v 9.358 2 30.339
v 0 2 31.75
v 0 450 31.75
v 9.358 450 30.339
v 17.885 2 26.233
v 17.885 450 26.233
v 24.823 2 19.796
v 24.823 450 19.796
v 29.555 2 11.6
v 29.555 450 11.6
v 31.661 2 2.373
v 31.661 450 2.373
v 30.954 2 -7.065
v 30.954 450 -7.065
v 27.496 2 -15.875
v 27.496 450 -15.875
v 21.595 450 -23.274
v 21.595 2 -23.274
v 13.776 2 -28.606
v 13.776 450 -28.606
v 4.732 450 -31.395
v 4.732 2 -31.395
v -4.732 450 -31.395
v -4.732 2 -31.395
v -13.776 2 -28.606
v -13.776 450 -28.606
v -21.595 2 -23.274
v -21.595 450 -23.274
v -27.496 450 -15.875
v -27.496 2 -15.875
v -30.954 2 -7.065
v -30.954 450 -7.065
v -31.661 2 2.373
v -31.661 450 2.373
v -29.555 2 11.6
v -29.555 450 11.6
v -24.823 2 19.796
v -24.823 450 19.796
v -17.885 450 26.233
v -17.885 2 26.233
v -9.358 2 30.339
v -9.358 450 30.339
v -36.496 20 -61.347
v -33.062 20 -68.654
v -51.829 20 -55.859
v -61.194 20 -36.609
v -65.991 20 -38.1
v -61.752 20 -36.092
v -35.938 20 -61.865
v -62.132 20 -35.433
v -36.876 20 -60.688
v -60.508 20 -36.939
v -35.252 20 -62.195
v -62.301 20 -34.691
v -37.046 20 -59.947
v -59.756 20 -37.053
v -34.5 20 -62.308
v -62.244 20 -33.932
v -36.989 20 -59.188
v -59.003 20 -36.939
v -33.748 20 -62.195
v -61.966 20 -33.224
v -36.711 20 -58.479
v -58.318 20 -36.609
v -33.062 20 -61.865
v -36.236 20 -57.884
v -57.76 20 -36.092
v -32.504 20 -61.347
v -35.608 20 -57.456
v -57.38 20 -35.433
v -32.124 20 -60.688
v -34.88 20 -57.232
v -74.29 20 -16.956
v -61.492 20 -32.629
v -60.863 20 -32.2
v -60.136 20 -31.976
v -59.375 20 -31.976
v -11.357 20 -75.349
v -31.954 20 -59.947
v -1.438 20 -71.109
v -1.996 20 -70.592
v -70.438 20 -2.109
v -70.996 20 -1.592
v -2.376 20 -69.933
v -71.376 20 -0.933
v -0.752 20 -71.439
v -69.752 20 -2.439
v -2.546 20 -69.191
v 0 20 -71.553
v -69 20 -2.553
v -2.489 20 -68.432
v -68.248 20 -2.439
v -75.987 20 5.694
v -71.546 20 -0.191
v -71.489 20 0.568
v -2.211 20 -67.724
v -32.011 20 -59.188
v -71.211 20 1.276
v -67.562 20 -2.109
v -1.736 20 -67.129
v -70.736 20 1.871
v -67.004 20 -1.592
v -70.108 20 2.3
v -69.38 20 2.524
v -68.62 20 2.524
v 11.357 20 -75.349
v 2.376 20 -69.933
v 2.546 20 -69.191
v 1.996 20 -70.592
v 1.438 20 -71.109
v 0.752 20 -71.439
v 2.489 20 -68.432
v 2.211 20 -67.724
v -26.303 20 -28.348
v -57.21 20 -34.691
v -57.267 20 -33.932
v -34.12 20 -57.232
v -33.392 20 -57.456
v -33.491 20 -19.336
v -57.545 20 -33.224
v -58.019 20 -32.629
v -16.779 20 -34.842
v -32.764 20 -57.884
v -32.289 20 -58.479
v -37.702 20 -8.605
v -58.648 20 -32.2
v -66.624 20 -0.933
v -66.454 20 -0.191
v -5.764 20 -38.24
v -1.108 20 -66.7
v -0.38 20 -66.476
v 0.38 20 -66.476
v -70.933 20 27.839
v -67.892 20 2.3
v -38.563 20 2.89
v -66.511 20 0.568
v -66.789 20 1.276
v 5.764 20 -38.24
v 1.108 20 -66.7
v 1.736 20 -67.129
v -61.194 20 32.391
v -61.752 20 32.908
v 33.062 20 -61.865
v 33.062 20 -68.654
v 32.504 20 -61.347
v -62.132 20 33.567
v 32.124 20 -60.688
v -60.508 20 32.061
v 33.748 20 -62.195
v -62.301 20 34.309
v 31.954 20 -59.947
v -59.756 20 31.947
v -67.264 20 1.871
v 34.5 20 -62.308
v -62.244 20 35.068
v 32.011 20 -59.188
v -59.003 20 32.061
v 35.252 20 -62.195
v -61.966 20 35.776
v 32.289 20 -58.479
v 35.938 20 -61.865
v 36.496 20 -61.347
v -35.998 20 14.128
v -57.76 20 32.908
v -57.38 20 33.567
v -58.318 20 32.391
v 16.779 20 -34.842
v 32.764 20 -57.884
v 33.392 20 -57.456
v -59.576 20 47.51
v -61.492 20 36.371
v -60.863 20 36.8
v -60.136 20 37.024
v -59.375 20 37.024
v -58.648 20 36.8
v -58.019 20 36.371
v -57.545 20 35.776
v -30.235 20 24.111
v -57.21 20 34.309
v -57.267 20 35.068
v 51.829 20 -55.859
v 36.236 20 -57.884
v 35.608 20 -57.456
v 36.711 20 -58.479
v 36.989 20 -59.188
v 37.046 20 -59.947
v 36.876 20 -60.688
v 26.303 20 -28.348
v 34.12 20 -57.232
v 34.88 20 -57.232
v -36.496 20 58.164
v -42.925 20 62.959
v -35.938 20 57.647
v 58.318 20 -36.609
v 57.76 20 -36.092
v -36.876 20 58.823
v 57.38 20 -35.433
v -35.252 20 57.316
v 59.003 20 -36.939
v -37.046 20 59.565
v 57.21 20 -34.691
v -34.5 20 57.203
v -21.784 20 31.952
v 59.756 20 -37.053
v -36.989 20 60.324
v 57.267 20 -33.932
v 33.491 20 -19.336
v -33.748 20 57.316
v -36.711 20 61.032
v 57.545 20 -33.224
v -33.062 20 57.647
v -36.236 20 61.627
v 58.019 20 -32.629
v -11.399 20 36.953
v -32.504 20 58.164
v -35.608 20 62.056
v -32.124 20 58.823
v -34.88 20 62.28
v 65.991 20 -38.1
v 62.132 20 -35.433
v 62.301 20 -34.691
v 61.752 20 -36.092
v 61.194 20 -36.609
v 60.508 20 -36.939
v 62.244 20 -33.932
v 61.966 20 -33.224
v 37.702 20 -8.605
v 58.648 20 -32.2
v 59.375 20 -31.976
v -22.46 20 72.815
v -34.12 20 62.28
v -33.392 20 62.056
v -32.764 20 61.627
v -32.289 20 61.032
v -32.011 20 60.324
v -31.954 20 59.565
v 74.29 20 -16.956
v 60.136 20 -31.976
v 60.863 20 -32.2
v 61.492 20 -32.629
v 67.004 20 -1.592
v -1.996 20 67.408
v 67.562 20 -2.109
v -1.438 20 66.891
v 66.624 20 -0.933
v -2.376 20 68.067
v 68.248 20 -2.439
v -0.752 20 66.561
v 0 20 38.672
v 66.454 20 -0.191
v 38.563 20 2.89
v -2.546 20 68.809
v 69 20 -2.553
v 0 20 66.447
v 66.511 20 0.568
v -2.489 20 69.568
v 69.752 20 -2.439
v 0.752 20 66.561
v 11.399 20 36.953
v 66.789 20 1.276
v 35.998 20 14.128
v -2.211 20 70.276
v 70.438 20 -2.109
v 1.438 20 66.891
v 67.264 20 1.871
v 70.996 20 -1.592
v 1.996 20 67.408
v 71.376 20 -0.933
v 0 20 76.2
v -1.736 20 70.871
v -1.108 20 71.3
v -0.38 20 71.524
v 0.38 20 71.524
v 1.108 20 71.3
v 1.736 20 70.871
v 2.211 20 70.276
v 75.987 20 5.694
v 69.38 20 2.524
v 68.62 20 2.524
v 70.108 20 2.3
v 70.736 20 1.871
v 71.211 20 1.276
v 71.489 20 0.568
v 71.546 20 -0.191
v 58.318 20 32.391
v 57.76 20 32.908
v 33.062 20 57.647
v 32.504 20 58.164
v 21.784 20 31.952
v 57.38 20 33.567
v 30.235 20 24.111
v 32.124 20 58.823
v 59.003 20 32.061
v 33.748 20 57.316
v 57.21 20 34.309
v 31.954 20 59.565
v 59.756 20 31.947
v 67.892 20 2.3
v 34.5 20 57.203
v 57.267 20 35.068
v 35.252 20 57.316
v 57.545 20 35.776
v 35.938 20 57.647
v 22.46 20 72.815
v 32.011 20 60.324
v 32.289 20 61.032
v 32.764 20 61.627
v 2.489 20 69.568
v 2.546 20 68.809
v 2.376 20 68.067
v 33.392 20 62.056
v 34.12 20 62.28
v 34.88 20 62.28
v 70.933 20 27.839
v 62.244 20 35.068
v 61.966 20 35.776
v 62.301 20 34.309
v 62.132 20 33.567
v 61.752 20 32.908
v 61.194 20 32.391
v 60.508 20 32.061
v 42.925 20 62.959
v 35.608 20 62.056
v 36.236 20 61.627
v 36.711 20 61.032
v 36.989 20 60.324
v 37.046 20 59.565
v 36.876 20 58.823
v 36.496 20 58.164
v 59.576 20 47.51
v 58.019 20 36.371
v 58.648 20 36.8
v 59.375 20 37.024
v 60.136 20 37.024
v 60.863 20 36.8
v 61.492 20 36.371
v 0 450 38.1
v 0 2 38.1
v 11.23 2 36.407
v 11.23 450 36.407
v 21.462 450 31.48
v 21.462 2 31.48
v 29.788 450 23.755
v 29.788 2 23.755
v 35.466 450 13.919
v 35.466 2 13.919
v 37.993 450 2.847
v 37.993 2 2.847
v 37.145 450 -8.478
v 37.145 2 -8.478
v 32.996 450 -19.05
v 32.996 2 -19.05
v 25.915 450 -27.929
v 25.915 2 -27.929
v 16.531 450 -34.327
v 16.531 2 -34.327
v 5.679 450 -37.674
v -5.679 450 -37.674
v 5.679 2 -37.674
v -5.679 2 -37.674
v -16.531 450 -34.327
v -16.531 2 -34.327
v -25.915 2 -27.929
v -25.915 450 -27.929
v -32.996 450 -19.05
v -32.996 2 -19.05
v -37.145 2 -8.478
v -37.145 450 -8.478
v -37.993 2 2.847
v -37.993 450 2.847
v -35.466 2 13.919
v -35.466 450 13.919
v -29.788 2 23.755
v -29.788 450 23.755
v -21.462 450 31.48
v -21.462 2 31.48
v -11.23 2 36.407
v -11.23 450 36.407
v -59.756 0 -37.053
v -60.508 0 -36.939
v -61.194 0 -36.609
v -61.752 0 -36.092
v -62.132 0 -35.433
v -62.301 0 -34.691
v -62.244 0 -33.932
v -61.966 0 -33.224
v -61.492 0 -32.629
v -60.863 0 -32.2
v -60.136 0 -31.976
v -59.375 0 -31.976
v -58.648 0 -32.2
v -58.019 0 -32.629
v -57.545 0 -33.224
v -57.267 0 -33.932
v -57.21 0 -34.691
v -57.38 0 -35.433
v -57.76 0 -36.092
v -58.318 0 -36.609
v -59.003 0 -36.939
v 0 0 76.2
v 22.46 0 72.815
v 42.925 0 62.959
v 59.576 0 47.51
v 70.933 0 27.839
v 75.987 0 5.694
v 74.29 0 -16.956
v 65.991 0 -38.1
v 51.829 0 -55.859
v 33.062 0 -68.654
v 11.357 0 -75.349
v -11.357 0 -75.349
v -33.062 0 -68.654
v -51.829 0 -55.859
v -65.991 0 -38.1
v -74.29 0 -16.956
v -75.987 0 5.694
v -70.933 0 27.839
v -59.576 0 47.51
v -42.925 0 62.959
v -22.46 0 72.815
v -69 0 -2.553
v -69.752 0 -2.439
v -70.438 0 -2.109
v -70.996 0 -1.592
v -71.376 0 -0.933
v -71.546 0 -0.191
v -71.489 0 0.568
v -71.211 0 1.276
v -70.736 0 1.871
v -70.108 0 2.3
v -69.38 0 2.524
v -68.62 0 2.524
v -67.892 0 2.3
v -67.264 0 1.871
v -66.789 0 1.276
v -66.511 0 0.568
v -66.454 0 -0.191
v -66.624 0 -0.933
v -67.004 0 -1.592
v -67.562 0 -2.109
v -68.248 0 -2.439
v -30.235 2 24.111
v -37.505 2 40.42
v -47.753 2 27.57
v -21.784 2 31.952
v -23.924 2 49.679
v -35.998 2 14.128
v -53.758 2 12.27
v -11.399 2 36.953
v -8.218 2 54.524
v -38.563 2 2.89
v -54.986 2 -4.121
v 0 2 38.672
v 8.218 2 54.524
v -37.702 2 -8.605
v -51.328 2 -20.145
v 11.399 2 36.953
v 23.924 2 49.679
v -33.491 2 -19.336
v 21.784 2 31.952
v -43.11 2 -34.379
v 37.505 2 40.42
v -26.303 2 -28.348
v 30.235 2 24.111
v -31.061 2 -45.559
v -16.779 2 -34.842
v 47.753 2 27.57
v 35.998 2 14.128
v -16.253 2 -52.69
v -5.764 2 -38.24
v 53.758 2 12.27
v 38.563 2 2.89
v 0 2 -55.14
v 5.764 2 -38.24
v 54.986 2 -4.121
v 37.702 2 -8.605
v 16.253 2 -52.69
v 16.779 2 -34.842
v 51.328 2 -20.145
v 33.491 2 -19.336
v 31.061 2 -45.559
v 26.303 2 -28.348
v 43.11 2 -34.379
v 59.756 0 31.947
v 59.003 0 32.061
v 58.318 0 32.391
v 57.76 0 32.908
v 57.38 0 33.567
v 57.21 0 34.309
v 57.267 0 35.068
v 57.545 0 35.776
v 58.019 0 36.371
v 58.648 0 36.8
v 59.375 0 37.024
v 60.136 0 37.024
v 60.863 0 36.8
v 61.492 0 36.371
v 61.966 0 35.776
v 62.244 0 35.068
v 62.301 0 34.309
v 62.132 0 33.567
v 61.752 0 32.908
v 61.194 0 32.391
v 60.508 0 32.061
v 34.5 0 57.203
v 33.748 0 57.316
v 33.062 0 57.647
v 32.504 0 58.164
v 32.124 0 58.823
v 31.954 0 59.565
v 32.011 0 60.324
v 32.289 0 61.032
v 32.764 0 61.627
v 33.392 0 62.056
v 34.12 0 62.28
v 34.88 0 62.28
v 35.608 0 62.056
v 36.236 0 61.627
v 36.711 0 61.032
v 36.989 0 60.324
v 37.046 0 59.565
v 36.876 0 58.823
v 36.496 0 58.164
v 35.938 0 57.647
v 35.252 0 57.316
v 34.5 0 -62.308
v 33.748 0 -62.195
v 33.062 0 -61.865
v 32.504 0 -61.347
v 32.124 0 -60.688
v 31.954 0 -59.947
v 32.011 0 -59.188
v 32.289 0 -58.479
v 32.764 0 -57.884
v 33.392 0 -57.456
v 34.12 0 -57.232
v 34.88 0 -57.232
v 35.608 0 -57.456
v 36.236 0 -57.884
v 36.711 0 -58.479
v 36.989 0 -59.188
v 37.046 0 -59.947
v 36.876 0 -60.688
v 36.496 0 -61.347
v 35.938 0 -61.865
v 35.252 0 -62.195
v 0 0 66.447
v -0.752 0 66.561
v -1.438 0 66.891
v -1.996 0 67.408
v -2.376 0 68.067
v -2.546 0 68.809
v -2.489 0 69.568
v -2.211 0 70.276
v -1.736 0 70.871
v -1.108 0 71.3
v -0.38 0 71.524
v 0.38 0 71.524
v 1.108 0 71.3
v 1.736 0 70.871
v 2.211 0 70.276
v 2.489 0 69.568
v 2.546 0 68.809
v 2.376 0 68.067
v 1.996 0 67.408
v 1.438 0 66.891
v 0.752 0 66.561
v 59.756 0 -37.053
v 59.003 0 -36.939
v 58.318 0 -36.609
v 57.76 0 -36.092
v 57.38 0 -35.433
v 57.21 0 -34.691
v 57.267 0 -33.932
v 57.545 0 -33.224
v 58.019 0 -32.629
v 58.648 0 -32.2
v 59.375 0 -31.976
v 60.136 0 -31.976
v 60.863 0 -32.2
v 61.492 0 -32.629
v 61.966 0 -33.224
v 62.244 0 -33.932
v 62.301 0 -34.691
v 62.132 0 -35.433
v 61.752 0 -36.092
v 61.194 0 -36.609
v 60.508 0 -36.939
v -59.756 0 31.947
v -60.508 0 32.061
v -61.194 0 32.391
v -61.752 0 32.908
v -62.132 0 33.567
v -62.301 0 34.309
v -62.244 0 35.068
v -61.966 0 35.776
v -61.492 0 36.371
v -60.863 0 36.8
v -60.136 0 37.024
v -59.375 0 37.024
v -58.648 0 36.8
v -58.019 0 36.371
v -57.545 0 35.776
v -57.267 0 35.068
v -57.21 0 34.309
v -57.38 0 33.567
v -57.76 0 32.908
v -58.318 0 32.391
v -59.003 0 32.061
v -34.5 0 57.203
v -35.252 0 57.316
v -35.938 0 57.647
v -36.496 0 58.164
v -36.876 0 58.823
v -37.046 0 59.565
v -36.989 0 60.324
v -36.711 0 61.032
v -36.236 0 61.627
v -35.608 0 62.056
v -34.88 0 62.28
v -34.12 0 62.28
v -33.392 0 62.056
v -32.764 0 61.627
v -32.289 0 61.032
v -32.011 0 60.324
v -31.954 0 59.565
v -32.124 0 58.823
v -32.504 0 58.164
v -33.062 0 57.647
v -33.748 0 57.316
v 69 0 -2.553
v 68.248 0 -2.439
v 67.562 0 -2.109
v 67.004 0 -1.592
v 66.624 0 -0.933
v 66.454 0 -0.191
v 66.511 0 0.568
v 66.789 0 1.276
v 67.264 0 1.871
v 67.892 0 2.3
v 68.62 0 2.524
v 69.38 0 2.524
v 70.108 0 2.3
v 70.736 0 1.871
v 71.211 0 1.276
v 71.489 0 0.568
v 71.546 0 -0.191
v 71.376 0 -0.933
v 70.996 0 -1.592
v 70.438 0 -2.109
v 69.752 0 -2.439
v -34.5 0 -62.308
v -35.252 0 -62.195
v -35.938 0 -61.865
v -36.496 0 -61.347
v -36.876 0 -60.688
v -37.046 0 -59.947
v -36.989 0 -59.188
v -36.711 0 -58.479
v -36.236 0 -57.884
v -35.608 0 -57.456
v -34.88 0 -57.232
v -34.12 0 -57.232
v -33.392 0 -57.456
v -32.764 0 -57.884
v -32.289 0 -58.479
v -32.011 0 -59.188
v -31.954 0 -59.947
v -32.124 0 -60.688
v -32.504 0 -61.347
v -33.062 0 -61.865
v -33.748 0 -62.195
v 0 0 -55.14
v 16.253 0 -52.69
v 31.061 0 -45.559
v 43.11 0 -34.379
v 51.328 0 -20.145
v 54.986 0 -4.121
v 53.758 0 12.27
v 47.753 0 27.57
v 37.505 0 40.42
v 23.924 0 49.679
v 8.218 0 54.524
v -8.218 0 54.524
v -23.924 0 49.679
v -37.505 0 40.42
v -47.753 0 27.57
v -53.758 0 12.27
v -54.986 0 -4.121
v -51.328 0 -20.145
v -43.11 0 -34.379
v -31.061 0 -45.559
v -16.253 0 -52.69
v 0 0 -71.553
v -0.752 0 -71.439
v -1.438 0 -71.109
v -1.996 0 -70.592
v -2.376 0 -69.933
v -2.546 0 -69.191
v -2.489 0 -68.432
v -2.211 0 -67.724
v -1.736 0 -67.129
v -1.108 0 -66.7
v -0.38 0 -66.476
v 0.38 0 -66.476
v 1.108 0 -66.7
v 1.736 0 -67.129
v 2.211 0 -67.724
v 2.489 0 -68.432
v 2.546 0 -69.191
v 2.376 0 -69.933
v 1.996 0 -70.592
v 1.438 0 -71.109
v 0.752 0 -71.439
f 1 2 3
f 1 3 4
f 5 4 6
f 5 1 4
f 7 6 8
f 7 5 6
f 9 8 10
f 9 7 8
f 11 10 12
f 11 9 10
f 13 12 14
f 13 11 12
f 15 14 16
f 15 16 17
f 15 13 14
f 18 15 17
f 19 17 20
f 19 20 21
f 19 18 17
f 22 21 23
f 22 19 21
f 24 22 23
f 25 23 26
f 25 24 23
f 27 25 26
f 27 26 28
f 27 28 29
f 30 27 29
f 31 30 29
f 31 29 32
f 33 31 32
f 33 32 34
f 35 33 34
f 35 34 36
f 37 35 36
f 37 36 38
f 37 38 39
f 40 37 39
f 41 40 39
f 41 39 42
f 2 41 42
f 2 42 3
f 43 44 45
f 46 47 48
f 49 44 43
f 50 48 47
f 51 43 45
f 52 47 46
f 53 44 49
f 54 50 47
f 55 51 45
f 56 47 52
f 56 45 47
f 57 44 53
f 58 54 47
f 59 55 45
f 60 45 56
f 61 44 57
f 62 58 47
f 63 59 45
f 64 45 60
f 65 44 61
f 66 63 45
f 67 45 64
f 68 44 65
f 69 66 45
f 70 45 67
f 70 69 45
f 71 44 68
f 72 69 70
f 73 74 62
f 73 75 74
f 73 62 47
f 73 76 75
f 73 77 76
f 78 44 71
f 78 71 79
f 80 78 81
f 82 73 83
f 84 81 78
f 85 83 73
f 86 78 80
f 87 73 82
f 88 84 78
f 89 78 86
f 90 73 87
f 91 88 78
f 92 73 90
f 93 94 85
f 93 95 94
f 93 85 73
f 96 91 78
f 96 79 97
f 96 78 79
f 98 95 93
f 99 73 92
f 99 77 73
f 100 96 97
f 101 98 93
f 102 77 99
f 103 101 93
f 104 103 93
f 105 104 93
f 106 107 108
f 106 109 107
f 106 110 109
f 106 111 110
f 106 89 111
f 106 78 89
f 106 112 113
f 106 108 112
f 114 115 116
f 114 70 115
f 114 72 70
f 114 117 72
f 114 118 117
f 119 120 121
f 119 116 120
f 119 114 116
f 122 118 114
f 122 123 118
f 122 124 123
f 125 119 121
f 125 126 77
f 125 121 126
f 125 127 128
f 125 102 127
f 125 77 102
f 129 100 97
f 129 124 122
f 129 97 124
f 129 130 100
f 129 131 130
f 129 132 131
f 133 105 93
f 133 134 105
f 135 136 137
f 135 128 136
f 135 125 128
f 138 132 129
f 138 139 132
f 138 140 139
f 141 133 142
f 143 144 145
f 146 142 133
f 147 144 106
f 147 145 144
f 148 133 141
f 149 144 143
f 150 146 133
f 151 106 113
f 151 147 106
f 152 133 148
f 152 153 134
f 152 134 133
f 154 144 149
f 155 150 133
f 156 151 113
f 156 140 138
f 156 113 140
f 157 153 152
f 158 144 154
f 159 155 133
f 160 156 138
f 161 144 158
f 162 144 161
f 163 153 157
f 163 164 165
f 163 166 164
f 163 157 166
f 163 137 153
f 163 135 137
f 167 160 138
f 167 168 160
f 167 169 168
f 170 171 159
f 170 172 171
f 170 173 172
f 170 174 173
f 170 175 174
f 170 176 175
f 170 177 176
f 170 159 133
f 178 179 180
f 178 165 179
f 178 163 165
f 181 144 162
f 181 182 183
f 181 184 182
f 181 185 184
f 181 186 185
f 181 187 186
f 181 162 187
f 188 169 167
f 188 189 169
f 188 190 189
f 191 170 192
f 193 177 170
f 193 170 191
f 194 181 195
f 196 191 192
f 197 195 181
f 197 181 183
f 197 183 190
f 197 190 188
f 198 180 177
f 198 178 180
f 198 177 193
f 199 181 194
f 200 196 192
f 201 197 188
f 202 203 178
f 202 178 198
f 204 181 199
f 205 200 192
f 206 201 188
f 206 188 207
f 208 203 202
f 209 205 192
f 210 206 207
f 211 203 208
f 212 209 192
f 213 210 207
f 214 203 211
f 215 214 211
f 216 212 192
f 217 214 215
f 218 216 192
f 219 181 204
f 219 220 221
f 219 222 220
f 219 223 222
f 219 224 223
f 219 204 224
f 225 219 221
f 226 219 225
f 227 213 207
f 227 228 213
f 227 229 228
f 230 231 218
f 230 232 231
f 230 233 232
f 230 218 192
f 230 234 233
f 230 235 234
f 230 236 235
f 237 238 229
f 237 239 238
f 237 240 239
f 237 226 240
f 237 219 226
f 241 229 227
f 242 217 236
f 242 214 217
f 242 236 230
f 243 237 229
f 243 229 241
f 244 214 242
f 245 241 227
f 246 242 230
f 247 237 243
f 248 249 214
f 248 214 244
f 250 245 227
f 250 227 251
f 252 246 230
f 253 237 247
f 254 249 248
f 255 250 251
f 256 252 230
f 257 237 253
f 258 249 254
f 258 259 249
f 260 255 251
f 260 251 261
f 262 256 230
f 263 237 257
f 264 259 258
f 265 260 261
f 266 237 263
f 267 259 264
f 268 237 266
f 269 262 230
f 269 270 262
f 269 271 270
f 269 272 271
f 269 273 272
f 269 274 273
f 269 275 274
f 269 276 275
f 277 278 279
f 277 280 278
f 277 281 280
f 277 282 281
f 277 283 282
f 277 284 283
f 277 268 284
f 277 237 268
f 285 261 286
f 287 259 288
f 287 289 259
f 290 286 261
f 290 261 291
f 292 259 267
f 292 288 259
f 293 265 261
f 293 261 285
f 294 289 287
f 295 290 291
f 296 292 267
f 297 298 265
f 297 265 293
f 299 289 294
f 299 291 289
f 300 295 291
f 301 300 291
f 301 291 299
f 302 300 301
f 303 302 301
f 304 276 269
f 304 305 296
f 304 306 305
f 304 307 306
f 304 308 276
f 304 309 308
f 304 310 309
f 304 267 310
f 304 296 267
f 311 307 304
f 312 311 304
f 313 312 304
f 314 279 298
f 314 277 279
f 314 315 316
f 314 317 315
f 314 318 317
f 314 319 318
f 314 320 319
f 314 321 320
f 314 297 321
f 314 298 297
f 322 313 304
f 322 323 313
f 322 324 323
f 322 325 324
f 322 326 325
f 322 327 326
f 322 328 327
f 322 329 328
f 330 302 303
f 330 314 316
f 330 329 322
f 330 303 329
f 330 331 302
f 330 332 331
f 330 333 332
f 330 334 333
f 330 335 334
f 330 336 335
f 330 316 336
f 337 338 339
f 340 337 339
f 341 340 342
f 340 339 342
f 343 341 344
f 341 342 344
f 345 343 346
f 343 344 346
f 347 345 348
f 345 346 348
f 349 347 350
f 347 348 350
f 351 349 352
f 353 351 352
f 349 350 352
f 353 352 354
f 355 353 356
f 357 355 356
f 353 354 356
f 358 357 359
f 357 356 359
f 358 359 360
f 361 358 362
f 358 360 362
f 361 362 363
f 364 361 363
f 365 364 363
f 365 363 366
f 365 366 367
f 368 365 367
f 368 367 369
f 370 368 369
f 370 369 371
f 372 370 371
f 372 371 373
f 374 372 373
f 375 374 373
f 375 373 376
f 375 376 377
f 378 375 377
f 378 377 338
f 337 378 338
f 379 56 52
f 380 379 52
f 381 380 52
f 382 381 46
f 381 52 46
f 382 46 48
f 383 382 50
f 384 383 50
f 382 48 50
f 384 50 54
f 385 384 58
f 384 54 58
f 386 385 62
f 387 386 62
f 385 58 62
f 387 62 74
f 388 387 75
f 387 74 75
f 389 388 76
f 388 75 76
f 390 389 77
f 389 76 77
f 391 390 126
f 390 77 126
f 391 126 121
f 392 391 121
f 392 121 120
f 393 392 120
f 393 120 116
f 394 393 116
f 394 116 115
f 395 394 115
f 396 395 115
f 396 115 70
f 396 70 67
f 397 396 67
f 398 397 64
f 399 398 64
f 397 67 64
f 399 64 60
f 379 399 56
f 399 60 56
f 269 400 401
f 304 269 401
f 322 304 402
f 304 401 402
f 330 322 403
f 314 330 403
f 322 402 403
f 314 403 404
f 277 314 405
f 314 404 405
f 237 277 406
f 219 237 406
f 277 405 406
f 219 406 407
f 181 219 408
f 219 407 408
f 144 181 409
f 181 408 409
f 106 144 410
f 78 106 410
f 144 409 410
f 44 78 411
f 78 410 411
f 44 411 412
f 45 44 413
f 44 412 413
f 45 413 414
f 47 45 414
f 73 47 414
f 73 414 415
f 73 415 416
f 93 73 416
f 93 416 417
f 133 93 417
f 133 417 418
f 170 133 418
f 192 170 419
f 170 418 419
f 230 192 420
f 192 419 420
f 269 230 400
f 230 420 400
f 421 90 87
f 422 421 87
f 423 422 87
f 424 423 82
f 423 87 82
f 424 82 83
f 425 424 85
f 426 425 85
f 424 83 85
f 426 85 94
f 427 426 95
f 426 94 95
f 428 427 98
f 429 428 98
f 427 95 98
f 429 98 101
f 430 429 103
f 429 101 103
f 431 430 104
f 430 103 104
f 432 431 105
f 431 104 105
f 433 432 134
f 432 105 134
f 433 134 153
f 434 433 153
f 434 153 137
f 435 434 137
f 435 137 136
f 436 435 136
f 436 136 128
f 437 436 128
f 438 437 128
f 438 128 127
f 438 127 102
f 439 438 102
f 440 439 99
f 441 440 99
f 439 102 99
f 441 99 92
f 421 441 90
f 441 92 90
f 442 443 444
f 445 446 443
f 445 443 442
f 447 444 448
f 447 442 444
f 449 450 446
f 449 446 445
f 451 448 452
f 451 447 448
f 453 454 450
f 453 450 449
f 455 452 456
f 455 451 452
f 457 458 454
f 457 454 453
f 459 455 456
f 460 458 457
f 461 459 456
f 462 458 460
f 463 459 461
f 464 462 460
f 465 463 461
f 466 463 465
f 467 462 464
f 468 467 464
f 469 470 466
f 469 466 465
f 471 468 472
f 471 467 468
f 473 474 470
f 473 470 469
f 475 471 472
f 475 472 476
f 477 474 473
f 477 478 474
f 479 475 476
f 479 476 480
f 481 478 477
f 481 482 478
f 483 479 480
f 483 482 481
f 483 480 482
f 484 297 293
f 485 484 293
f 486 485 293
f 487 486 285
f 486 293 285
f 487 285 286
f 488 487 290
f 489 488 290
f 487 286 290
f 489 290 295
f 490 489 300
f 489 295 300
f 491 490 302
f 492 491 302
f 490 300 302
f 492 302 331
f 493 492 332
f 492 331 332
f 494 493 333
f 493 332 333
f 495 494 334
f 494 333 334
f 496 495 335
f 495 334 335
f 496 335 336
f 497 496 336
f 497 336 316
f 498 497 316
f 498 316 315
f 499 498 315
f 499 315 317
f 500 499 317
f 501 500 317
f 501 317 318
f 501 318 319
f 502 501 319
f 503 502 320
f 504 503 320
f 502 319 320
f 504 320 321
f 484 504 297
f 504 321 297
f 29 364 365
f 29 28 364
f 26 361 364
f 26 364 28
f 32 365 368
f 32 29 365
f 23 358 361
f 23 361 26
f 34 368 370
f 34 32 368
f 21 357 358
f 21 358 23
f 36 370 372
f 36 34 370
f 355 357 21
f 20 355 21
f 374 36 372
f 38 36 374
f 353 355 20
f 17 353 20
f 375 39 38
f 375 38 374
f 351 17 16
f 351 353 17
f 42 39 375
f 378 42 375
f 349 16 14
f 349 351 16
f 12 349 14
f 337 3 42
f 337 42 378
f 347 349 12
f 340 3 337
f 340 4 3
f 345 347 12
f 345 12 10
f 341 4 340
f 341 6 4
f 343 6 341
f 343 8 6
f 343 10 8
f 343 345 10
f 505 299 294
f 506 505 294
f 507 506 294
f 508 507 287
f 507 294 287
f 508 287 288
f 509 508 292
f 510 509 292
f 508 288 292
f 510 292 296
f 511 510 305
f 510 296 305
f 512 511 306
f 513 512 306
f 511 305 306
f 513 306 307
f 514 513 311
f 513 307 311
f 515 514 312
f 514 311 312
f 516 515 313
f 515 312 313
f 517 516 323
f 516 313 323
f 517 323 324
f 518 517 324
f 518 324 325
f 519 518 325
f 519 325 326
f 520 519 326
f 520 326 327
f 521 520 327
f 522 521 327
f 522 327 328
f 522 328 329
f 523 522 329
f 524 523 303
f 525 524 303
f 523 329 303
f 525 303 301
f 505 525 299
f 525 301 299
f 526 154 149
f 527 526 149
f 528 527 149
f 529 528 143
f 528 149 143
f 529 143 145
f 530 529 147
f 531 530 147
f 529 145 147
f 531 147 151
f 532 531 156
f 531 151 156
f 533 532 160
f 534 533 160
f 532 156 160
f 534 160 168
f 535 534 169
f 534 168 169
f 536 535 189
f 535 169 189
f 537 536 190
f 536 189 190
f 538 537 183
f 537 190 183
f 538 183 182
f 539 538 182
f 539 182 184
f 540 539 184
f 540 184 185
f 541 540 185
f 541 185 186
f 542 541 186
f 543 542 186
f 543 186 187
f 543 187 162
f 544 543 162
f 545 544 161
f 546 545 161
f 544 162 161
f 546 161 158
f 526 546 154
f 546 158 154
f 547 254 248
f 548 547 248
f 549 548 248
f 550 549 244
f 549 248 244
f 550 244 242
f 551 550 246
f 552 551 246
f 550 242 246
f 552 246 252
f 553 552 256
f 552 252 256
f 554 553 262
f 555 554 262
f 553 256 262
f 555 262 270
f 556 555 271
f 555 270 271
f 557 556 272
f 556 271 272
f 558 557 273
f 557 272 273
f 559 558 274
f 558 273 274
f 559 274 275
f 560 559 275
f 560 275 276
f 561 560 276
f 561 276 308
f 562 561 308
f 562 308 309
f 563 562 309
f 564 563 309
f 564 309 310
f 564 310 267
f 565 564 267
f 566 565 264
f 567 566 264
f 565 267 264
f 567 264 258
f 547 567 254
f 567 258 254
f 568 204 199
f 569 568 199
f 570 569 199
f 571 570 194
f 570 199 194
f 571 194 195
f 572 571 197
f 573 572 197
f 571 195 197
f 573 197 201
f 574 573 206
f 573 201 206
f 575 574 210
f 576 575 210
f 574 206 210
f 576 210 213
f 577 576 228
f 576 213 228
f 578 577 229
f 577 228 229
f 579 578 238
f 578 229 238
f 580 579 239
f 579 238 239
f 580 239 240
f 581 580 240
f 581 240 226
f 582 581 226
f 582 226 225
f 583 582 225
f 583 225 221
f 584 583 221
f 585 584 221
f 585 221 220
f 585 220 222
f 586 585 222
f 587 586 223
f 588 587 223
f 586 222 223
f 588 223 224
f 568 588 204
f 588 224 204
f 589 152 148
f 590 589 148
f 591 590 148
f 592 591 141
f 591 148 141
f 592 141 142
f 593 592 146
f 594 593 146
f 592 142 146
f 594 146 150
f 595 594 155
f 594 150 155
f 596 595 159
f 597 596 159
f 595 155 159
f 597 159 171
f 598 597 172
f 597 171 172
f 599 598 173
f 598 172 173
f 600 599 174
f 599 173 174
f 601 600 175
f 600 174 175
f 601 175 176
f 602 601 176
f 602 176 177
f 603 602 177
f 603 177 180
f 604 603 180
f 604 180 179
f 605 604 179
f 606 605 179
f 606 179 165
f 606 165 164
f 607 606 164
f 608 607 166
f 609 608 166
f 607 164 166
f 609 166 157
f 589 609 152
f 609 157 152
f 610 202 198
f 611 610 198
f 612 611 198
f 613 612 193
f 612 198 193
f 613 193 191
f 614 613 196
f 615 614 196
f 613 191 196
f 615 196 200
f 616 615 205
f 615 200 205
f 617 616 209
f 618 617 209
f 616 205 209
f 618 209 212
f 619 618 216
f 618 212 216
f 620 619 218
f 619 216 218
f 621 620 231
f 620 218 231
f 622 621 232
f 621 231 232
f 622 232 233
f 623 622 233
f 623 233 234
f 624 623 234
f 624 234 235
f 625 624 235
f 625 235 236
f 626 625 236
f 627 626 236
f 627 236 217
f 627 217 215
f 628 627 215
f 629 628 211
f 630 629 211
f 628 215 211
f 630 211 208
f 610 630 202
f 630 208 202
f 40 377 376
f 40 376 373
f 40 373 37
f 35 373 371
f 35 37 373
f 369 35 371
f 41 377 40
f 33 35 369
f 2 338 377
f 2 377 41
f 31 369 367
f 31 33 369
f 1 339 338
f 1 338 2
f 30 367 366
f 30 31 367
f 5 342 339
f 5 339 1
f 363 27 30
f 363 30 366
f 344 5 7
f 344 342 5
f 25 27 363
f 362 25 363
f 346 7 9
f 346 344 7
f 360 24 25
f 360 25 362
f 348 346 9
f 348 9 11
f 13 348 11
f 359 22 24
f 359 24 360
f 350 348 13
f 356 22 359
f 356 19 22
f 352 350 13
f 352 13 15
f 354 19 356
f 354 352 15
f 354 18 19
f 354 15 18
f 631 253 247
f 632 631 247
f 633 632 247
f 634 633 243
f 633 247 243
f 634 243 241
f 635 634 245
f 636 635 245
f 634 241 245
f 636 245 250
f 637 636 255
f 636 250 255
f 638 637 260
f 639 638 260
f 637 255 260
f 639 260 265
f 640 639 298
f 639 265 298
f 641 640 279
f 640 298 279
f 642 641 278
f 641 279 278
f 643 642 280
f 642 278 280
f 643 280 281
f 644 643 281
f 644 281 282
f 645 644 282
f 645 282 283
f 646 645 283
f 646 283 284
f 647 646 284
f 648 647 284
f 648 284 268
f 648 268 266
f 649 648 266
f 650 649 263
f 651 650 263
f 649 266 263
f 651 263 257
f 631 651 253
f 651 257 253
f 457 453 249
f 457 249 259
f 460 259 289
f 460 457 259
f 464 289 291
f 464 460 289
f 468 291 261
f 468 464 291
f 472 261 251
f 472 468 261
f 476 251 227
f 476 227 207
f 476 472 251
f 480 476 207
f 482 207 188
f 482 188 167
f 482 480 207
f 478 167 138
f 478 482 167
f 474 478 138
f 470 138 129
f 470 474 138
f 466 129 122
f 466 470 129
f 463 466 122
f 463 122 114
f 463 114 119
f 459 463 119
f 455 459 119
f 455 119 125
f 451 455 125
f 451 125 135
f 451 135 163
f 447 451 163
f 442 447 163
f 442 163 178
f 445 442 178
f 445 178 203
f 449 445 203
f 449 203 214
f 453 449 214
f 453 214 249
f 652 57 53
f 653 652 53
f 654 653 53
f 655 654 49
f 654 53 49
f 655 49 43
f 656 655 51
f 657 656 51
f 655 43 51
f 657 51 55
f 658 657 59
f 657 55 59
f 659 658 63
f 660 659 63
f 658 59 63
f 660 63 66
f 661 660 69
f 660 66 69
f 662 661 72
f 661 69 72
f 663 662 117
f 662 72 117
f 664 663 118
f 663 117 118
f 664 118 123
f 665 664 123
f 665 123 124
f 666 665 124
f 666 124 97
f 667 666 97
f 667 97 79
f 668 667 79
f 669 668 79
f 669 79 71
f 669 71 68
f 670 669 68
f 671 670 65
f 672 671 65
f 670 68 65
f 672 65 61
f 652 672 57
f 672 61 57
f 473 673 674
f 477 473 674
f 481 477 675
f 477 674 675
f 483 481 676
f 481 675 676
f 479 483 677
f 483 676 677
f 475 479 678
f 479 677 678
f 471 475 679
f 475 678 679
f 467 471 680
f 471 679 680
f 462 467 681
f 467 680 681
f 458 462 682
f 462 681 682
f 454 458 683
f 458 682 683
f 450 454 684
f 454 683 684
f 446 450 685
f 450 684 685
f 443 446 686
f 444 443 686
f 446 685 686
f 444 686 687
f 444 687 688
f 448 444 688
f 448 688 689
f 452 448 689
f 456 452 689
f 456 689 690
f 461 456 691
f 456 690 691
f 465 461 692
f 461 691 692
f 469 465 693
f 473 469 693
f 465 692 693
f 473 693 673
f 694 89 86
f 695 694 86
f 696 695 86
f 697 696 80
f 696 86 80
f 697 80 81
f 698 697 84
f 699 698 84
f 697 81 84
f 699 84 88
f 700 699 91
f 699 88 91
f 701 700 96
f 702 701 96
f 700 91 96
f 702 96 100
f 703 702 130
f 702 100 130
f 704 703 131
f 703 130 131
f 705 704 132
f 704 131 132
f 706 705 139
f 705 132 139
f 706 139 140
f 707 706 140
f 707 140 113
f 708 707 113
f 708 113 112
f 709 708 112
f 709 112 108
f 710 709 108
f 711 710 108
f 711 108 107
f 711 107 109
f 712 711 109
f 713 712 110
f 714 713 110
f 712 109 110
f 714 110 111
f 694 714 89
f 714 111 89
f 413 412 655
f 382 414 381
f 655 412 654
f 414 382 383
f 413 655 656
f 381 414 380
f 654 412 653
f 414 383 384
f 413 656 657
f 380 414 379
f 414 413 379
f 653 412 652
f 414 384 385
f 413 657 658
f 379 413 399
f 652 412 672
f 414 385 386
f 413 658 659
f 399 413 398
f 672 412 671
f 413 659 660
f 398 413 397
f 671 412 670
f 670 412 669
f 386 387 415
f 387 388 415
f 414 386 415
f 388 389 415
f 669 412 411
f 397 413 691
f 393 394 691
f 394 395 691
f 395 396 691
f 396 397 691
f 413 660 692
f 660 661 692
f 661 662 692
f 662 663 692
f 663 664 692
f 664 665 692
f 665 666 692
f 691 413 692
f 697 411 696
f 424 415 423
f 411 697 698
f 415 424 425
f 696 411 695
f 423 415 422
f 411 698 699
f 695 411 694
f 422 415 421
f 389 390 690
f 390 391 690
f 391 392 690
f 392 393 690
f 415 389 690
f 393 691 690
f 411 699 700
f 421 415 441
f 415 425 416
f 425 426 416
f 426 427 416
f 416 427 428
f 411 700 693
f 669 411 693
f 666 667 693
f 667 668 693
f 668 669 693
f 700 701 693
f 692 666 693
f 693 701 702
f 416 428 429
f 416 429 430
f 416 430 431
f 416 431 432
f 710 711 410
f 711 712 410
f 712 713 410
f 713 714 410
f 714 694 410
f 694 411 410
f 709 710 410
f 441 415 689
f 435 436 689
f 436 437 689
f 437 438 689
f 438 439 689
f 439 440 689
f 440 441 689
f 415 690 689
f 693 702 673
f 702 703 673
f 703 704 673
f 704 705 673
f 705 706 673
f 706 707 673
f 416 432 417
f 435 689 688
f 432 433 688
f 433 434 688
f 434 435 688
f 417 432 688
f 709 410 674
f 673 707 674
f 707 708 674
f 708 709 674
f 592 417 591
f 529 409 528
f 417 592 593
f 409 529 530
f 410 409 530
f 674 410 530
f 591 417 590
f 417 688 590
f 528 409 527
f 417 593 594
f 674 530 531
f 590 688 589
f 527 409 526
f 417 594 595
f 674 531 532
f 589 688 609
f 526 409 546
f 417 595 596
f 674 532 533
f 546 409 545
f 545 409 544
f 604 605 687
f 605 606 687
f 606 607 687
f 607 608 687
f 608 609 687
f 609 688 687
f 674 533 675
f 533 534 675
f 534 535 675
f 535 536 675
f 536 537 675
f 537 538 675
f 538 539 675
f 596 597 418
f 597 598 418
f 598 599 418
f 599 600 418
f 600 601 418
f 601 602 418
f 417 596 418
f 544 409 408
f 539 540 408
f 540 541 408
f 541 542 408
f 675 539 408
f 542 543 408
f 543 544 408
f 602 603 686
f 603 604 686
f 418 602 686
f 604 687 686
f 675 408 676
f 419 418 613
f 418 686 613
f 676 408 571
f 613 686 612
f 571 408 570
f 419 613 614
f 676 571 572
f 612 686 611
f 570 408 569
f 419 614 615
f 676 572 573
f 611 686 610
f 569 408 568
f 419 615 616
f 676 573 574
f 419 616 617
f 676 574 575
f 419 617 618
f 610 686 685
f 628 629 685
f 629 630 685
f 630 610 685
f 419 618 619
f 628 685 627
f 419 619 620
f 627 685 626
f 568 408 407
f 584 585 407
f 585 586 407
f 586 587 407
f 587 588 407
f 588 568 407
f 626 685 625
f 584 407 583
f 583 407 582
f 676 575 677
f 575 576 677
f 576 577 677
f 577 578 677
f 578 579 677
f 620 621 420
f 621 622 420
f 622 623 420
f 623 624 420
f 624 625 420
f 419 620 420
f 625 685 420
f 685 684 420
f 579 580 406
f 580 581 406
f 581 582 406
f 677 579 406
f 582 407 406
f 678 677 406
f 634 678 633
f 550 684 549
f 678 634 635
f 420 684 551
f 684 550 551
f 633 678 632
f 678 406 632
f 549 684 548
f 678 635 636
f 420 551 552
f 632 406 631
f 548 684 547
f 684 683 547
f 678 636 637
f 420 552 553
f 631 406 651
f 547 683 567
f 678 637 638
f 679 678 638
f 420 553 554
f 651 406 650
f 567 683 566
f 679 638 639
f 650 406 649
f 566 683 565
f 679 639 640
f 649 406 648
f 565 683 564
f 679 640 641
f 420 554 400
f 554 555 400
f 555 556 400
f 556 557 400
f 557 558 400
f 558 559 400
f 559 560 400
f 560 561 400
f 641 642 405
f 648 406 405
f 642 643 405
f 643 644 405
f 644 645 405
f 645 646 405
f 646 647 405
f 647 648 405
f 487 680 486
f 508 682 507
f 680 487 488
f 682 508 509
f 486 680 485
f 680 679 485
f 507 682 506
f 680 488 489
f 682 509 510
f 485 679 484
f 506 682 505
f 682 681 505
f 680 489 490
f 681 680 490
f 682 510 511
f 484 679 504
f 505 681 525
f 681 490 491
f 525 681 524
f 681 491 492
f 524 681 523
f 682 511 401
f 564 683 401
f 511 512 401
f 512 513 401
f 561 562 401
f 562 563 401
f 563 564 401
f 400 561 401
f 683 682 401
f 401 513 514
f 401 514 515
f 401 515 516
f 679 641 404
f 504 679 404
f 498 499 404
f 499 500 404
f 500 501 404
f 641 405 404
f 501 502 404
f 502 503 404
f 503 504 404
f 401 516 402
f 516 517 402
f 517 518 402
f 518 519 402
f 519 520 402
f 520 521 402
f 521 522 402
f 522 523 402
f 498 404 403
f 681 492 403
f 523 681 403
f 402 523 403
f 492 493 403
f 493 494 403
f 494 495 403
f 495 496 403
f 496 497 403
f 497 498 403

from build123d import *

# Parameters (mm, degrees)
SKETCH1_R                        = 38.1
SKETCH1_R_2                      = 31.75
BOSS_EXTRUDE1_DEPTH              = 450
SKETCH2_R                        = 76.2
SKETCH2_R_2                      = 38.6715
BOSS_EXTRUDE2_DEPTH              = 20
SKETCH5_W                        = 2.5527
SKETCH5_H                        = 450
F_10_CLEARANCE_HOLE1_AT_2_COUNT  = 2
F_10_CLEARANCE_HOLE1_AT_2_PITCH  = 35.717028224
F_10_CLEARANCE_HOLE1_AT_3_COUNT  = 2
F_10_CLEARANCE_HOLE1_AT_3_PITCH  = 69
F_10_CLEARANCE_HOLE1_AT_4_COUNT  = 2
F_10_CLEARANCE_HOLE1_AT_4_PITCH  = 97.580735804
F_10_CLEARANCE_HOLE1_AT_5_COUNT  = 2
F_10_CLEARANCE_HOLE1_AT_5_PITCH  = 119.511505722
F_10_CLEARANCE_HOLE1_AT_6_COUNT  = 2
F_10_CLEARANCE_HOLE1_AT_6_PITCH  = 133.297764028
F_10_CLEARANCE_HOLE1_AT_7_COUNT  = 2
F_10_CLEARANCE_HOLE1_AT_7_PITCH  = 138
F_10_CLEARANCE_HOLE1_AT_8_COUNT  = 2
F_10_CLEARANCE_HOLE1_AT_8_PITCH  = 133.297764028
F_10_CLEARANCE_HOLE1_AT_9_COUNT  = 2
F_10_CLEARANCE_HOLE1_AT_9_PITCH  = 119.511505722
F_10_CLEARANCE_HOLE1_AT_10_COUNT = 2
F_10_CLEARANCE_HOLE1_AT_10_PITCH = 97.580735804
F_10_CLEARANCE_HOLE1_AT_11_COUNT = 2
F_10_CLEARANCE_HOLE1_AT_11_PITCH = 69
F_10_CLEARANCE_HOLE1_AT_12_COUNT = 2
F_10_CLEARANCE_HOLE1_AT_12_PITCH = 35.717028224
SKETCH6_R                        = 55.14
CUT_EXTRUDE1_DEPTH               = 2


with BuildPart() as part:
    # Sketch1 → Boss-Extrude1 (new body)
    with BuildSketch(Plane(origin=(0, 0, 0), x_dir=(1, 0, 0), z_dir=(0, 1, 0))):
        Circle(SKETCH1_R)
        Circle(SKETCH1_R_2, mode=Mode.SUBTRACT)
    extrude(amount=BOSS_EXTRUDE1_DEPTH)


with BuildPart() as body_2:
    # Sketch2 → Boss-Extrude2 (new body)
    with BuildSketch(Plane(origin=(0, 0, 0), x_dir=(1, 0, 0), z_dir=(0, 1, 0))):
        Circle(SKETCH2_R)
        Circle(SKETCH2_R_2, mode=Mode.SUBTRACT)
    extrude(amount=BOSS_EXTRUDE2_DEPTH)

    # Sketch5 → #10 Clearance Hole1 (revolve, cut)
    with BuildSketch(Plane(origin=(69, 0, 0), x_dir=(0, 0, -1), z_dir=(1, 0, 0))):
        with Locations((1.27635, 225)):
            Rectangle(SKETCH5_W, SKETCH5_H)
    f_10_clearance_hole1 = revolve(axis=Axis((69, -6.35, 0), (0, 1, 0)), mode=Mode.SUBTRACT)

    # #10 Clearance Hole1 at 2: #10 Clearance Hole1 ×2
    with Locations(*[Vector(-0.25881904510252135, 0, -0.9659258262890681) * (i * F_10_CLEARANCE_HOLE1_AT_2_PITCH) for i in range(1, F_10_CLEARANCE_HOLE1_AT_2_COUNT)]):
        add(f_10_clearance_hole1, mode=Mode.SUBTRACT)

    # #10 Clearance Hole1 at 3: #10 Clearance Hole1 ×2
    with Locations(*[Vector(-0.5000000000000009, 0, -0.8660254037844382) * (i * F_10_CLEARANCE_HOLE1_AT_3_PITCH) for i in range(1, F_10_CLEARANCE_HOLE1_AT_3_COUNT)]):
        add(f_10_clearance_hole1, mode=Mode.SUBTRACT)

    # #10 Clearance Hole1 at 4: #10 Clearance Hole1 ×2
    with Locations(*[Vector(-0.7071067811865487, 0, -0.7071067811865464) * (i * F_10_CLEARANCE_HOLE1_AT_4_PITCH) for i in range(1, F_10_CLEARANCE_HOLE1_AT_4_COUNT)]):
        add(f_10_clearance_hole1, mode=Mode.SUBTRACT)

    # #10 Clearance Hole1 at 5: #10 Clearance Hole1 ×2
    with Locations(*[Vector(-0.8660254037844397, 0, -0.49999999999999817) * (i * F_10_CLEARANCE_HOLE1_AT_5_PITCH) for i in range(1, F_10_CLEARANCE_HOLE1_AT_5_COUNT)]):
        add(f_10_clearance_hole1, mode=Mode.SUBTRACT)

    # #10 Clearance Hole1 at 6: #10 Clearance Hole1 ×2
    with Locations(*[Vector(-0.9659258262890691, 0, -0.258819045102518) * (i * F_10_CLEARANCE_HOLE1_AT_6_PITCH) for i in range(1, F_10_CLEARANCE_HOLE1_AT_6_COUNT)]):
        add(f_10_clearance_hole1, mode=Mode.SUBTRACT)

    # #10 Clearance Hole1 at 7: #10 Clearance Hole1 ×2
    with Locations(*[(-i * F_10_CLEARANCE_HOLE1_AT_7_PITCH, 0, 0) for i in range(1, F_10_CLEARANCE_HOLE1_AT_7_COUNT)]):
        add(f_10_clearance_hole1, mode=Mode.SUBTRACT)

    # #10 Clearance Hole1 at 8: #10 Clearance Hole1 ×2
    with Locations(*[Vector(-0.9659258262890672, 0, 0.2588190451025248) * (i * F_10_CLEARANCE_HOLE1_AT_8_PITCH) for i in range(1, F_10_CLEARANCE_HOLE1_AT_8_COUNT)]):
        add(f_10_clearance_hole1, mode=Mode.SUBTRACT)

    # #10 Clearance Hole1 at 9: #10 Clearance Hole1 ×2
    with Locations(*[Vector(-0.8660254037844364, 0, 0.500000000000004) * (i * F_10_CLEARANCE_HOLE1_AT_9_PITCH) for i in range(1, F_10_CLEARANCE_HOLE1_AT_9_COUNT)]):
        add(f_10_clearance_hole1, mode=Mode.SUBTRACT)

    # #10 Clearance Hole1 at 10: #10 Clearance Hole1 ×2
    with Locations(*[Vector(-0.7071067811865439, 0, 0.7071067811865512) * (i * F_10_CLEARANCE_HOLE1_AT_10_PITCH) for i in range(1, F_10_CLEARANCE_HOLE1_AT_10_COUNT)]):
        add(f_10_clearance_hole1, mode=Mode.SUBTRACT)

    # #10 Clearance Hole1 at 11: #10 Clearance Hole1 ×2
    with Locations(*[Vector(-0.49999999999999495, 0, 0.8660254037844416) * (i * F_10_CLEARANCE_HOLE1_AT_11_PITCH) for i in range(1, F_10_CLEARANCE_HOLE1_AT_11_COUNT)]):
        add(f_10_clearance_hole1, mode=Mode.SUBTRACT)

    # #10 Clearance Hole1 at 12: #10 Clearance Hole1 ×2
    with Locations(*[Vector(-0.25881904510251413, 0, 0.96592582628907) * (i * F_10_CLEARANCE_HOLE1_AT_12_PITCH) for i in range(1, F_10_CLEARANCE_HOLE1_AT_12_COUNT)]):
        add(f_10_clearance_hole1, mode=Mode.SUBTRACT)


with BuildPart() as cut_extrude1_tool:
    # Sketch6 → Cut-Extrude1 (new body)
    with BuildSketch(Plane.XZ):
        Circle(SKETCH6_R)
    extrude(amount=-CUT_EXTRUDE1_DEPTH)


with BuildPart() as part_1:
    add(part.part)

    # Cut-Extrude1: cut by cut_extrude1_tool
    add(cut_extrude1_tool.part, mode=Mode.SUBTRACT)


with BuildPart() as body_2_1:
    add(body_2.part)

    # Cut-Extrude1: cut by cut_extrude1_tool
    add(cut_extrude1_tool.part, mode=Mode.SUBTRACT)


solid = Compound([part_1.part, body_2_1.part])
